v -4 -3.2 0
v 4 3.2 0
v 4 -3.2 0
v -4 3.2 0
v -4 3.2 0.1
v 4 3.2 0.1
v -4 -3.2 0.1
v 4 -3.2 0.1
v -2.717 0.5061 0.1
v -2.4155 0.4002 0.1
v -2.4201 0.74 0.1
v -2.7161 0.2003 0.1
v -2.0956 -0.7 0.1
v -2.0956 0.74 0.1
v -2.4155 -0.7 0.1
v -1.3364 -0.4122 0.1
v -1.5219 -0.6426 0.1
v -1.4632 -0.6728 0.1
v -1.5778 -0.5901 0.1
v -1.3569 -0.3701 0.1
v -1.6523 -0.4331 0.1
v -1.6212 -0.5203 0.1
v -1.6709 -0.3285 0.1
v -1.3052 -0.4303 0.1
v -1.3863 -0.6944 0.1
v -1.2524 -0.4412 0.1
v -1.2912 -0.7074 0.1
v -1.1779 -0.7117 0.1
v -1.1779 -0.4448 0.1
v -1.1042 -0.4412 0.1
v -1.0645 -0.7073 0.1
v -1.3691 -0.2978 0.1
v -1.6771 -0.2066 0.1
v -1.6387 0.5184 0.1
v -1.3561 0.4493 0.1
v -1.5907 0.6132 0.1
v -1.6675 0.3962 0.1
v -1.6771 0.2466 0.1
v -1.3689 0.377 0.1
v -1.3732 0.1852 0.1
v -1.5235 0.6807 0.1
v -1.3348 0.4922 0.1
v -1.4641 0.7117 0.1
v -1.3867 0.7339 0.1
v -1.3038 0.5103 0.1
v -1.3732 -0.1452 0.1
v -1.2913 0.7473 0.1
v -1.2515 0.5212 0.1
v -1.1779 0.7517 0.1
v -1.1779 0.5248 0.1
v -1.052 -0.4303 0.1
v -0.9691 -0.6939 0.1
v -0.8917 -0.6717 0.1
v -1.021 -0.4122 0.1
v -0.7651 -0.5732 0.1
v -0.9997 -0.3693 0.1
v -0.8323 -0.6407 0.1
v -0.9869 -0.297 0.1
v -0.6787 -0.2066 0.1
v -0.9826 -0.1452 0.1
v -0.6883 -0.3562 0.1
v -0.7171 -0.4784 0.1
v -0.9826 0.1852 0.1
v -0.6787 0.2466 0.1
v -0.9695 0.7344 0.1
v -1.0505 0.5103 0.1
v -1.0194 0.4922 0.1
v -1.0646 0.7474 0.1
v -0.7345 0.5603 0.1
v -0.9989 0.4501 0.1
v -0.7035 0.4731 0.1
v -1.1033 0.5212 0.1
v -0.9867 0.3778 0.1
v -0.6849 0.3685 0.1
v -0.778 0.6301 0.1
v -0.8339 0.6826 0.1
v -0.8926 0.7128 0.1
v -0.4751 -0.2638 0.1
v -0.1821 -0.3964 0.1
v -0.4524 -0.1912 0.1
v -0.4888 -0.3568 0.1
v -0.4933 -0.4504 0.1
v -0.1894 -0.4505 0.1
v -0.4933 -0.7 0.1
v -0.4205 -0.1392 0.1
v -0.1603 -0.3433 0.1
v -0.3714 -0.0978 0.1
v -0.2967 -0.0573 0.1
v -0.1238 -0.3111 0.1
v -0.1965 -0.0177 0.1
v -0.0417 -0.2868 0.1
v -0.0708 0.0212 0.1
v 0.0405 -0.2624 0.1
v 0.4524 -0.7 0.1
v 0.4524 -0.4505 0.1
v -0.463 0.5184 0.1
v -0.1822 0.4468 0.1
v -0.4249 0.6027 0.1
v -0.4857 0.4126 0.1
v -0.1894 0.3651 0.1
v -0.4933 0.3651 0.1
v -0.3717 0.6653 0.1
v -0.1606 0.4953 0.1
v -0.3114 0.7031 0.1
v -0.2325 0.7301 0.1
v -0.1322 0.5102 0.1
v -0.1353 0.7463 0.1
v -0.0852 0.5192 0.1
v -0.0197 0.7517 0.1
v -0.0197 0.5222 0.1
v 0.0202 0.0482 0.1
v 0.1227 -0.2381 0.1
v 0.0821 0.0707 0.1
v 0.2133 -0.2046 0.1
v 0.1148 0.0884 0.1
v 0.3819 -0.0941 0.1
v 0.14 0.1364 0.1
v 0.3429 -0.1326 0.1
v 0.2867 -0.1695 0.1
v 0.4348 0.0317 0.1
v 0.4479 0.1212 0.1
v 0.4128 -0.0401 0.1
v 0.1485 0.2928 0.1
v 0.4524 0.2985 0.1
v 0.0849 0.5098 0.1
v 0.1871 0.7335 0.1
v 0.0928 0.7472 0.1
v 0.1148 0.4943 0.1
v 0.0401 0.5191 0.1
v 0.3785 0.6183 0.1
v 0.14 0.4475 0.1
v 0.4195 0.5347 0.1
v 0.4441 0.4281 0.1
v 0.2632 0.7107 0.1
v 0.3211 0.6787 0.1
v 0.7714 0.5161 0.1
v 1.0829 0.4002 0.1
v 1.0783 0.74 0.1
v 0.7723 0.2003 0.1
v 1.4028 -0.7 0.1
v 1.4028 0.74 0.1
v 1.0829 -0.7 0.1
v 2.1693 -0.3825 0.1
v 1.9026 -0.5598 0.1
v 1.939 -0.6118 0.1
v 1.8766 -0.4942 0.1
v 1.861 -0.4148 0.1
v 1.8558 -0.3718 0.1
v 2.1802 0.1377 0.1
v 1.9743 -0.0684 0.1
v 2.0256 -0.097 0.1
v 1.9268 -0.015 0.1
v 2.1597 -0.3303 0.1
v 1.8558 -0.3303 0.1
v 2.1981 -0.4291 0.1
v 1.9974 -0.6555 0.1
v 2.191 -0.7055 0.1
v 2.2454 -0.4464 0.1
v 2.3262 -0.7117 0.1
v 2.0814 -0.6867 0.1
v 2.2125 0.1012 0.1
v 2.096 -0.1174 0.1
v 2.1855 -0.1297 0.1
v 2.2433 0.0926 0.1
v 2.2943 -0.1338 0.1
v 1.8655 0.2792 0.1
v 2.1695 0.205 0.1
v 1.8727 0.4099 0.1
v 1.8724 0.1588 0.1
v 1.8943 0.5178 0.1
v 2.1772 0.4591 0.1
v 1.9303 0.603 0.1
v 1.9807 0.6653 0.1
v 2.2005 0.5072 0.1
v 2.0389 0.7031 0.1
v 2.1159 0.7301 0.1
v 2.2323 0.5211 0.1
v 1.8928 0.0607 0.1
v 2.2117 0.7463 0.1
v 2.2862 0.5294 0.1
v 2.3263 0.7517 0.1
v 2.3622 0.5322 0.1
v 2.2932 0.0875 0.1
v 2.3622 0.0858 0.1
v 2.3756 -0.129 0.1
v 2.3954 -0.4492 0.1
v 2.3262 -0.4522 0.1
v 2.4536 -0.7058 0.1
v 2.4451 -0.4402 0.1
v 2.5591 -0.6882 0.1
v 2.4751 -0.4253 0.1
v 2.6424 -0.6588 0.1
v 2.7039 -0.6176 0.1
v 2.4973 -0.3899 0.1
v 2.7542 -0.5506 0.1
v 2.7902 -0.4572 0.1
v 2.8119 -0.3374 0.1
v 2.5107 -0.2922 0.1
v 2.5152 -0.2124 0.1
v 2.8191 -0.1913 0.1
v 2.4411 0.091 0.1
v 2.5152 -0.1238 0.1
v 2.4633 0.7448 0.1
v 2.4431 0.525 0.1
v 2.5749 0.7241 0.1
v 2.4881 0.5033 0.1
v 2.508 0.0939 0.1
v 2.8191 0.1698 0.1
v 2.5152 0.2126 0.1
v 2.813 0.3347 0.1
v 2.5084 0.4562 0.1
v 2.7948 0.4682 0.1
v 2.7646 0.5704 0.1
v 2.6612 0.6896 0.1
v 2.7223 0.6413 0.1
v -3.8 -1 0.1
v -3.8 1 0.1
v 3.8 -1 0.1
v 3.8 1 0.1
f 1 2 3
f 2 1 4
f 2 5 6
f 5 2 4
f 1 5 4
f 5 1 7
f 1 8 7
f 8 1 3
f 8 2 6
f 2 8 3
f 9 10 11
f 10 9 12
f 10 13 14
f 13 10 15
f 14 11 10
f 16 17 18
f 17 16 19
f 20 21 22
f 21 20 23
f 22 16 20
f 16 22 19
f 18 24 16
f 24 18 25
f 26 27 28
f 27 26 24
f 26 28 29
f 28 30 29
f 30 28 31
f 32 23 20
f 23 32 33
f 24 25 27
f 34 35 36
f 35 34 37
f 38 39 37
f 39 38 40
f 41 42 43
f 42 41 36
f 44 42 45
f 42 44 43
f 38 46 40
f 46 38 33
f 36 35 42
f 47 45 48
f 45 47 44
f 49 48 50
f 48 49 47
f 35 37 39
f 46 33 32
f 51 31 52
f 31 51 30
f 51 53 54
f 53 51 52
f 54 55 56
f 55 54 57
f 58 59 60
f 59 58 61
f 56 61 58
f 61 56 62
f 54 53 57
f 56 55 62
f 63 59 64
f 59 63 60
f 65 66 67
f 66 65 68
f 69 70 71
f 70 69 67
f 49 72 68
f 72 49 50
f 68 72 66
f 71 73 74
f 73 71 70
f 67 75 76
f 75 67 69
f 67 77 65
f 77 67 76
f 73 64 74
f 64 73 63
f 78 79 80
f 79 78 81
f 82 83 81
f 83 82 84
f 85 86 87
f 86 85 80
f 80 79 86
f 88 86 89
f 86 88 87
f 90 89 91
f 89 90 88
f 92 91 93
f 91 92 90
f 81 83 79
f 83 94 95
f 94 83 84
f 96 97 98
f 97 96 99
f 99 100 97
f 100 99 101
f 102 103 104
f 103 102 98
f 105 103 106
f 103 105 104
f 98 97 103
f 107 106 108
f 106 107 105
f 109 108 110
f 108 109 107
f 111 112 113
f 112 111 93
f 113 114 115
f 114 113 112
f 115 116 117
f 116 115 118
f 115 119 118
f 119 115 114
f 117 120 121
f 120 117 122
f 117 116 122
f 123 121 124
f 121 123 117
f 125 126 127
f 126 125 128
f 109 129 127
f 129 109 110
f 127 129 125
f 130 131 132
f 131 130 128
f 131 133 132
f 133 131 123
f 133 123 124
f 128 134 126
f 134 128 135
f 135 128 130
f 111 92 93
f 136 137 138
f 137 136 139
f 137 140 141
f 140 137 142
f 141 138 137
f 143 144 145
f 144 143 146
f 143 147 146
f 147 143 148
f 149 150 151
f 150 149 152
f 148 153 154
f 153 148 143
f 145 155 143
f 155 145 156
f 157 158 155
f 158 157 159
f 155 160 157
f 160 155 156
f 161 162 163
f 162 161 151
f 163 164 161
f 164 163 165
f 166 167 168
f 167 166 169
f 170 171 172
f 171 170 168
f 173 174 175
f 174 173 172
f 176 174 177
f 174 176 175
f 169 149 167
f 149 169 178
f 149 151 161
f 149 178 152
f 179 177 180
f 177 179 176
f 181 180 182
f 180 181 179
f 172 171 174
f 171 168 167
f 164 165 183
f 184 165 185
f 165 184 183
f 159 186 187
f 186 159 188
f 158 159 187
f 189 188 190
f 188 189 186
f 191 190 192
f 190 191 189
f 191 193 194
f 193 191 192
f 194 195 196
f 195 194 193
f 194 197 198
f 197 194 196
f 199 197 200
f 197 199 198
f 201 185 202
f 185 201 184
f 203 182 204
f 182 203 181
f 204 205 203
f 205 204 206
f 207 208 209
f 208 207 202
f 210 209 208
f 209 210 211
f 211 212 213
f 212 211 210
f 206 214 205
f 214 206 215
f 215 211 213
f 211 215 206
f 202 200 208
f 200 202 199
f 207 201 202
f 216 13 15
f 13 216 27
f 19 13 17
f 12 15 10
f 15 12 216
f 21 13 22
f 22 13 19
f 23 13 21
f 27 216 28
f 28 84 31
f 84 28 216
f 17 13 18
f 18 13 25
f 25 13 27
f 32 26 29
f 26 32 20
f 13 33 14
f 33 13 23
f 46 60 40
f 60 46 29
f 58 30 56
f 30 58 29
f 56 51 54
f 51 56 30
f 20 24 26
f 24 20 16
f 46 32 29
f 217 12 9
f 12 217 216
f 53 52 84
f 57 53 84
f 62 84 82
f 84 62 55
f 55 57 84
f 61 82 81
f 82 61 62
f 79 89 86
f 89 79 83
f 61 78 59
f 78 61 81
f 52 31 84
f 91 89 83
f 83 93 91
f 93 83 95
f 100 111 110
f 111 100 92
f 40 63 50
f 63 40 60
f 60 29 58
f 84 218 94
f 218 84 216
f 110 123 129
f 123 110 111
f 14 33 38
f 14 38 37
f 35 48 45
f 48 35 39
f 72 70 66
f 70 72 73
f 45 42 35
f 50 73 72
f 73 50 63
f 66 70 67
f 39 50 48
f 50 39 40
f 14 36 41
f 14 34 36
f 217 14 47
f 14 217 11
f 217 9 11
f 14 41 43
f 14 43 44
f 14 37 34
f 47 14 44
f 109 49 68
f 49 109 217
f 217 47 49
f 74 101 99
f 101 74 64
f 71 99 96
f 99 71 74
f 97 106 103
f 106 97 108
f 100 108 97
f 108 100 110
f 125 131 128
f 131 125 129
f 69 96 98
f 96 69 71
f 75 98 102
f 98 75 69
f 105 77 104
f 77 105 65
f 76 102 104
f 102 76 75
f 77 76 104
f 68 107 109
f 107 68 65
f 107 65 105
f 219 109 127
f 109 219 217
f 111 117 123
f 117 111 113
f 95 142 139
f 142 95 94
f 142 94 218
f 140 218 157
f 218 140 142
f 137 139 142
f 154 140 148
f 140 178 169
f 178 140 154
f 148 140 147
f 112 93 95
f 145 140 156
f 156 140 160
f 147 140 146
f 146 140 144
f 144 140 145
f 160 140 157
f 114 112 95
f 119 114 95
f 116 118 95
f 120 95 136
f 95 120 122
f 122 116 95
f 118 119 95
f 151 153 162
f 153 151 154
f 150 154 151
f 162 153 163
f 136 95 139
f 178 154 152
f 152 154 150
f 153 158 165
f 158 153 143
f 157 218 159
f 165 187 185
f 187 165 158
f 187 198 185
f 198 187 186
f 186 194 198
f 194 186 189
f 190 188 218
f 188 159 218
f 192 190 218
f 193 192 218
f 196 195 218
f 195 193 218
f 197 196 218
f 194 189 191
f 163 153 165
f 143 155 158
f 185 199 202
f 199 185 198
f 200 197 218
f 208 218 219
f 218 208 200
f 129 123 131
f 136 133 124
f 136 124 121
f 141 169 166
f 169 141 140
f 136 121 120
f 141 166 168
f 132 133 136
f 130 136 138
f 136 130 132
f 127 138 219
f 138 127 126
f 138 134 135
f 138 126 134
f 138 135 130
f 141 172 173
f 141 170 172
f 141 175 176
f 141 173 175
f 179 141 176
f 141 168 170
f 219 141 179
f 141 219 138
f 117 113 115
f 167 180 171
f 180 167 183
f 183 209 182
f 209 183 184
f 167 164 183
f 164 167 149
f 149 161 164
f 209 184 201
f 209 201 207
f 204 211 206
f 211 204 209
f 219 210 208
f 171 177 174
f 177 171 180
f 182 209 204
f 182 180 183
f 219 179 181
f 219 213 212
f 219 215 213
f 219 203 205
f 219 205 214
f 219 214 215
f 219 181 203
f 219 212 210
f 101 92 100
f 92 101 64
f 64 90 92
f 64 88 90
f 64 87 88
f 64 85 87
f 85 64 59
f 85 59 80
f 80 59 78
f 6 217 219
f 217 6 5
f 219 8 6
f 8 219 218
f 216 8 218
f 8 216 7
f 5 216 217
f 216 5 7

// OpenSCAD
use <../lib.scad>
use <../p/box5-12.scad>
use <s/4616559ps6.scad>
use <s/4616559ps7.scad>
$fa=1; $fs=0.2;
function ldraw_lib__4616559o(realsolid=false) = [
// 0 Sticker  0.8 x  1 with Black "10219"
// 0 Name: 4616559o.dat
// 0 Author: J.C. Tchang [tchang]
// 0 !LDRAW_ORG Part UPDATE 2013-02
// 0 !LICENSE Licensed under CC BY 2.0 and CC BY 4.0 : see CAreadme.txt
// 
// 0 BFC CERTIFY CCW
  [0,"BFC","CERTIFY"],
  [0,"BFC","CCW"],
// 
// 0 !KEYWORDS Set 10219
// 
// 0 !HISTORY 2013-12-23 [PTadmin] Official Update 2013-02
// 
// 
// 1 16 0 -0.25 0 10 0 0 0 0.25 0 0 0 8 box5-12.dat
  [1,16,0,-0.25,0,10,0,0,0,0.25,0,0,0,8, ldraw_lib__box5_12(realsolid)],
// 0 //
// 1 0 0 -0.25 0 0.25 0 0 0 1 0 0 0 0.25 s\4616559ps6.dat
  [1,0,0,-0.25,0,0.25,0,0,0,1,0,0,0,0.25, ldraw_lib__s__4616559ps6(realsolid)],
// 1 16 0 -0.25 0 0.25 0 0 0 1 0 0 0 0.25 s\4616559ps7.dat
  [1,16,0,-0.25,0,0.25,0,0,0,1,0,0,0,0.25, ldraw_lib__s__4616559ps7(realsolid)],
// 0 //
// 4 16 10 -0.25 8 -10 -0.25 8 -9.5 -0.25 2.5 9.5 -0.25 2.5
  [4,16,10,-0.25,8,-10,-0.25,8,-9.5,-0.25,2.5,9.5,-0.25,2.5],
// 4 16 10 -0.25 -8 10 -0.25 8 9.5 -0.25 2.5 9.5 -0.25 -2.5
  [4,16,10,-0.25,-8,10,-0.25,8,9.5,-0.25,2.5,9.5,-0.25,-2.5],
// 4 16 10 -0.25 -8 9.5 -0.25 -2.5 -9.5 -0.25 -2.5 -10 -0.25 -8
  [4,16,10,-0.25,-8,9.5,-0.25,-2.5,-9.5,-0.25,-2.5,-10,-0.25,-8],
// 4 16 -10 -0.25 -8 -9.5 -0.25 -2.5 -9.5 -0.25 2.5 -10 -0.25 8
  [4,16,-10,-0.25,-8,-9.5,-0.25,-2.5,-9.5,-0.25,2.5,-10,-0.25,8],
];
module ldraw_lib__4616559o(step=0, col=false, unit=2/5, alt=false, line=0.2, solid=!$preview)
    makepoly(ldraw_lib__4616559o(solid), step=step, col=col, unit=unit, alt=alt, line=line, solid=solid);
ldraw_lib__4616559o(line=0.2);
